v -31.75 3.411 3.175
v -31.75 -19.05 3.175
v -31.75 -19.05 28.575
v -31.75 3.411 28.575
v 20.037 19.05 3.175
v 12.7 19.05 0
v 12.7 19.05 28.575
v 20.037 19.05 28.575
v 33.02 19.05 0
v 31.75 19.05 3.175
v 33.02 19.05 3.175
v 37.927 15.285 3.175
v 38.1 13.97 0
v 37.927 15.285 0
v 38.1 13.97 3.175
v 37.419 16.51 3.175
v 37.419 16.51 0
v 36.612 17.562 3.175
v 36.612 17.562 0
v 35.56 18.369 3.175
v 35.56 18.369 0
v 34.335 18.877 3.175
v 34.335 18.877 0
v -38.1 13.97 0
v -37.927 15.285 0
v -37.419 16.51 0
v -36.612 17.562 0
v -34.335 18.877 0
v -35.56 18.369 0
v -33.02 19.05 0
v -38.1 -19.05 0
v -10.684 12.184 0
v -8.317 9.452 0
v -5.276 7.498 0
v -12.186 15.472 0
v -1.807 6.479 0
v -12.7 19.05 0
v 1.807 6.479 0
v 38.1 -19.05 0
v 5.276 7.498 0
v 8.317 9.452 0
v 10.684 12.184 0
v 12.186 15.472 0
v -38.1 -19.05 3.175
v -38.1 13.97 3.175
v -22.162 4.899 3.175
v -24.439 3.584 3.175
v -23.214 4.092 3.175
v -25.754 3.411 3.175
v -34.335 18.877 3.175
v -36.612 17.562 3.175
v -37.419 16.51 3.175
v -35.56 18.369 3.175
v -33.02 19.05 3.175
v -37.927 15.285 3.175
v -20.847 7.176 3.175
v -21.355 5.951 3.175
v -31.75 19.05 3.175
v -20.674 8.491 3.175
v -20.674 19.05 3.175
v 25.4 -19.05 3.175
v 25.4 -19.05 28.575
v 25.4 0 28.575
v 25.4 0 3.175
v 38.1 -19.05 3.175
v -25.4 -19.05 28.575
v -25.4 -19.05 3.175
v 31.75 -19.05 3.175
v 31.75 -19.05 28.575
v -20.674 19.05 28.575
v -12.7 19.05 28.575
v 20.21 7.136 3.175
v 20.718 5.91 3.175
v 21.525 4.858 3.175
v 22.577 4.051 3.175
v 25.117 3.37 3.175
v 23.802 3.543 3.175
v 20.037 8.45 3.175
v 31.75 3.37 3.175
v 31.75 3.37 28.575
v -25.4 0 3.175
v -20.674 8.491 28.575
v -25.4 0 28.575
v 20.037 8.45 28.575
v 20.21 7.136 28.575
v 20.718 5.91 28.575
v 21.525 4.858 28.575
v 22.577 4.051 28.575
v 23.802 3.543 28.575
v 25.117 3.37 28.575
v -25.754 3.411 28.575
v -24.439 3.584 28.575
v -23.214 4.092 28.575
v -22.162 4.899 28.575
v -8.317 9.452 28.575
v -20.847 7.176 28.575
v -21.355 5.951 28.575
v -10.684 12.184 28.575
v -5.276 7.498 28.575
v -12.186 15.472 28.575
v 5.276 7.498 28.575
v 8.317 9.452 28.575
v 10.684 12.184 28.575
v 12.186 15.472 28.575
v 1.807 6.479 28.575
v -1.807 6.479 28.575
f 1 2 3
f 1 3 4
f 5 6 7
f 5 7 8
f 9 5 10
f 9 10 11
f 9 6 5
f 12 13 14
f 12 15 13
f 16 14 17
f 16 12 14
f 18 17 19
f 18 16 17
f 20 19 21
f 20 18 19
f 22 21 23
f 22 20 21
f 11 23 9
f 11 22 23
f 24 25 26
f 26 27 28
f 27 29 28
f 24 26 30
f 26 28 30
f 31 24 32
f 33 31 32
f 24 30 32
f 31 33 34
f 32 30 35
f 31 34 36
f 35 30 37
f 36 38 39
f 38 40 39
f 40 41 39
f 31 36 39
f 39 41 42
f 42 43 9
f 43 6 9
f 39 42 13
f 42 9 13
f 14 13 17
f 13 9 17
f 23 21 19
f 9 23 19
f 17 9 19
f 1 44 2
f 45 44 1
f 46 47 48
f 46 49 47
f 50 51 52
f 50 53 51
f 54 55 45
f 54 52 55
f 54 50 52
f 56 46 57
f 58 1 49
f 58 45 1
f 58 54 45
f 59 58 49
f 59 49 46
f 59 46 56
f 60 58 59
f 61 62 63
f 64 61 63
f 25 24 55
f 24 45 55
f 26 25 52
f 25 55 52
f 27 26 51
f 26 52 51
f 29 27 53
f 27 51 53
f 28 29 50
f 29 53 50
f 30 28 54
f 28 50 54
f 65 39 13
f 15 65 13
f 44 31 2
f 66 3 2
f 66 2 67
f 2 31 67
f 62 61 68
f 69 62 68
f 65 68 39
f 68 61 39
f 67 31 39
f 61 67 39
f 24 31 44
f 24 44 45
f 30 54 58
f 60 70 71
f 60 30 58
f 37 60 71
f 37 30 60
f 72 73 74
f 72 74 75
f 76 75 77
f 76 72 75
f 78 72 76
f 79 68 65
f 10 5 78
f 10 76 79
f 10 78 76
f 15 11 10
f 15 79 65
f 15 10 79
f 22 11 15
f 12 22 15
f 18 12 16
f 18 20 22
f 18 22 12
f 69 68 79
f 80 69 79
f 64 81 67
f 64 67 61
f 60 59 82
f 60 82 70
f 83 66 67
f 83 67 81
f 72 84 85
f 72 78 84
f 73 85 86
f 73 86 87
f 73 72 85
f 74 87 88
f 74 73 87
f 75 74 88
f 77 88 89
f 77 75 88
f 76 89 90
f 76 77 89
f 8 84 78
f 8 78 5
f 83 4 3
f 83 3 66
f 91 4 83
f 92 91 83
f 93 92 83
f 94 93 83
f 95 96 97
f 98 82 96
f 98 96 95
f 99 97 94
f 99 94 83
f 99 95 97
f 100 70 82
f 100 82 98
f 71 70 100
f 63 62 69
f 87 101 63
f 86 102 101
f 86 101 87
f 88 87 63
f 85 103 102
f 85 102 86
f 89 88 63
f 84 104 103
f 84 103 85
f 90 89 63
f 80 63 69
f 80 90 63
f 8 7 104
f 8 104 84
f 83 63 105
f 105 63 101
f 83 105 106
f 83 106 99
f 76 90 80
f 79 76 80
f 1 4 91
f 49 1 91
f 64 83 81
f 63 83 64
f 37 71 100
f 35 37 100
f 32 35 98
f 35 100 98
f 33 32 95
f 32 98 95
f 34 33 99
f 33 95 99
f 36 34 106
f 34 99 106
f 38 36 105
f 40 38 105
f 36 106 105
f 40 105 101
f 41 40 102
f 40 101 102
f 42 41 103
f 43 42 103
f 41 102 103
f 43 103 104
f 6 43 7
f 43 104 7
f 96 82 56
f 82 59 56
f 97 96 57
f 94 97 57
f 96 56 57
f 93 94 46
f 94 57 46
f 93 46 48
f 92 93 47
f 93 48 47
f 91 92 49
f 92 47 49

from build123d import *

# Parameters (mm, degrees)
F0_W      = 76.2
F0_H      = 38.1
F1_DEPTH  = 3.175
F2_R      = 5.08
F3_W      = 63.5
F3_H      = 38.1
F4_DEPTH  = 25.4
F5_W      = 50.8
F5_H      = 19.05
F6_DEPTH  = 25.4
F7_R      = 12.7
F8_DEPTH  = 28.576
F9_W      = 11.075838387
F9_H      = 15.6388808947
F10_DEPTH = 25.4
F11_R     = 5.08
F12_W     = 11.7130865455
F12_H     = 15.6796150815
F13_DEPTH = 25.4
F14_R     = 5.08


with BuildPart() as f1:
    # F0 (on Top) → F1 (new body)
    with BuildSketch(Plane.XY):
        Rectangle(F0_W, F0_H)
    extrude(amount=F1_DEPTH)

    # F2
    f2_edges = [f1.edges().sort_by_distance(p)[0] for p in [
        (-38.1, 19.05, 1.5875),
        (38.1, 19.05, 1.5875),
    ]]
    fillet(f2_edges, radius=F2_R)

    # F3 (on face) → F4 (join)
    with BuildSketch(Plane.XY.offset(3.175)):
        Rectangle(F3_W, F3_H)
    extrude(amount=F4_DEPTH)

    # F5 (on face) → F6 (cut)
    with BuildSketch(Plane.XY.offset(28.575)):
        with Locations((0, -9.525)):
            Rectangle(F5_W, F5_H)
    extrude(amount=-F6_DEPTH, mode=Mode.SUBTRACT)

    # F7 (on face) → F8 (cut, through all)
    with BuildSketch(Plane.XY.offset(28.575)):
        with Locations((0, 19.05)):
            Circle(F7_R)
    extrude(amount=-F8_DEPTH, mode=Mode.SUBTRACT)

    # F9 (on face) → F10 (cut)
    with BuildSketch(Plane.XY.offset(28.575)):
        with Locations((-26.2120808065, 11.2305595526)):
            Rectangle(F9_W, F9_H)
    extrude(amount=-F10_DEPTH, mode=Mode.SUBTRACT)

    # F11
    f11_edges = [f1.edges().sort_by_distance(p)[0] for p in [
        (-20.674162, 3.411119, 15.875),
    ]]
    fillet(f11_edges, radius=F11_R)

    # F12 (on face) → F13 (cut)
    with BuildSketch(Plane.XY.offset(28.575)):
        with Locations((25.8934567273, 11.2101924593)):
            Rectangle(F12_W, F12_H)
    extrude(amount=-F13_DEPTH, mode=Mode.SUBTRACT)

    # F14
    f14_edges = [f1.edges().sort_by_distance(p)[0] for p in [
        (20.036913, 3.370385, 15.875),
    ]]
    fillet(f14_edges, radius=F14_R)


solid = f1.part
